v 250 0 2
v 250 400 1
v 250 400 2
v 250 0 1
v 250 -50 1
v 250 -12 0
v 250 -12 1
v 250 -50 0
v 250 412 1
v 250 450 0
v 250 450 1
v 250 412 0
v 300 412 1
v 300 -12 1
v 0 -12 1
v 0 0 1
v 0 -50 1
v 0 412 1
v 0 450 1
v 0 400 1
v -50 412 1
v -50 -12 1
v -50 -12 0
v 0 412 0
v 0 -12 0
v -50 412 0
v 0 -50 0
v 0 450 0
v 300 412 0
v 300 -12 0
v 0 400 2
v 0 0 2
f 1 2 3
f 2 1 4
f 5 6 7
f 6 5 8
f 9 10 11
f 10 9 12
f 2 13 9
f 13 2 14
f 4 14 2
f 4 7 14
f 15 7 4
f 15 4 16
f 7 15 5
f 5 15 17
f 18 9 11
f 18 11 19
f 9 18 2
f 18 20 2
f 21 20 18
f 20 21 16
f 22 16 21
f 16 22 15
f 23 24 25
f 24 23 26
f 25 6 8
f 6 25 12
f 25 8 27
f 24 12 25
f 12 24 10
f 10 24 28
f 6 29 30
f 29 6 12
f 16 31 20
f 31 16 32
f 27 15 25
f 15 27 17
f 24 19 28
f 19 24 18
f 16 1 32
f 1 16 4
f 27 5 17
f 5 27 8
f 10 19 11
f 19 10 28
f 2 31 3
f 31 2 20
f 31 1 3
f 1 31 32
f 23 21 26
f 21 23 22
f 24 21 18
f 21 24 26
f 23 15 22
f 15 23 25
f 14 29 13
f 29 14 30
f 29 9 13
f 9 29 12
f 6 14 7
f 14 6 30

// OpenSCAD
pan_x = 250;
pan_y = 400;

color("gray") cube([pan_x,pan_y,2]);
translate([-50,-12,0])
  cube([50,pan_y+24,1]);
translate([pan_x,-12,0])
  cube([50,pan_y+24,1]);
color("orange") {
translate([0,-50,0])
  cube([pan_x,50,1]);
translate([0,pan_y,0])
  cube([pan_x,50,1]);
  
echo("width=",pan_y+100,(pan_y+100)/25.4);
echo("height",pan_x+100,(pan_x+100)/25.4);  
}
